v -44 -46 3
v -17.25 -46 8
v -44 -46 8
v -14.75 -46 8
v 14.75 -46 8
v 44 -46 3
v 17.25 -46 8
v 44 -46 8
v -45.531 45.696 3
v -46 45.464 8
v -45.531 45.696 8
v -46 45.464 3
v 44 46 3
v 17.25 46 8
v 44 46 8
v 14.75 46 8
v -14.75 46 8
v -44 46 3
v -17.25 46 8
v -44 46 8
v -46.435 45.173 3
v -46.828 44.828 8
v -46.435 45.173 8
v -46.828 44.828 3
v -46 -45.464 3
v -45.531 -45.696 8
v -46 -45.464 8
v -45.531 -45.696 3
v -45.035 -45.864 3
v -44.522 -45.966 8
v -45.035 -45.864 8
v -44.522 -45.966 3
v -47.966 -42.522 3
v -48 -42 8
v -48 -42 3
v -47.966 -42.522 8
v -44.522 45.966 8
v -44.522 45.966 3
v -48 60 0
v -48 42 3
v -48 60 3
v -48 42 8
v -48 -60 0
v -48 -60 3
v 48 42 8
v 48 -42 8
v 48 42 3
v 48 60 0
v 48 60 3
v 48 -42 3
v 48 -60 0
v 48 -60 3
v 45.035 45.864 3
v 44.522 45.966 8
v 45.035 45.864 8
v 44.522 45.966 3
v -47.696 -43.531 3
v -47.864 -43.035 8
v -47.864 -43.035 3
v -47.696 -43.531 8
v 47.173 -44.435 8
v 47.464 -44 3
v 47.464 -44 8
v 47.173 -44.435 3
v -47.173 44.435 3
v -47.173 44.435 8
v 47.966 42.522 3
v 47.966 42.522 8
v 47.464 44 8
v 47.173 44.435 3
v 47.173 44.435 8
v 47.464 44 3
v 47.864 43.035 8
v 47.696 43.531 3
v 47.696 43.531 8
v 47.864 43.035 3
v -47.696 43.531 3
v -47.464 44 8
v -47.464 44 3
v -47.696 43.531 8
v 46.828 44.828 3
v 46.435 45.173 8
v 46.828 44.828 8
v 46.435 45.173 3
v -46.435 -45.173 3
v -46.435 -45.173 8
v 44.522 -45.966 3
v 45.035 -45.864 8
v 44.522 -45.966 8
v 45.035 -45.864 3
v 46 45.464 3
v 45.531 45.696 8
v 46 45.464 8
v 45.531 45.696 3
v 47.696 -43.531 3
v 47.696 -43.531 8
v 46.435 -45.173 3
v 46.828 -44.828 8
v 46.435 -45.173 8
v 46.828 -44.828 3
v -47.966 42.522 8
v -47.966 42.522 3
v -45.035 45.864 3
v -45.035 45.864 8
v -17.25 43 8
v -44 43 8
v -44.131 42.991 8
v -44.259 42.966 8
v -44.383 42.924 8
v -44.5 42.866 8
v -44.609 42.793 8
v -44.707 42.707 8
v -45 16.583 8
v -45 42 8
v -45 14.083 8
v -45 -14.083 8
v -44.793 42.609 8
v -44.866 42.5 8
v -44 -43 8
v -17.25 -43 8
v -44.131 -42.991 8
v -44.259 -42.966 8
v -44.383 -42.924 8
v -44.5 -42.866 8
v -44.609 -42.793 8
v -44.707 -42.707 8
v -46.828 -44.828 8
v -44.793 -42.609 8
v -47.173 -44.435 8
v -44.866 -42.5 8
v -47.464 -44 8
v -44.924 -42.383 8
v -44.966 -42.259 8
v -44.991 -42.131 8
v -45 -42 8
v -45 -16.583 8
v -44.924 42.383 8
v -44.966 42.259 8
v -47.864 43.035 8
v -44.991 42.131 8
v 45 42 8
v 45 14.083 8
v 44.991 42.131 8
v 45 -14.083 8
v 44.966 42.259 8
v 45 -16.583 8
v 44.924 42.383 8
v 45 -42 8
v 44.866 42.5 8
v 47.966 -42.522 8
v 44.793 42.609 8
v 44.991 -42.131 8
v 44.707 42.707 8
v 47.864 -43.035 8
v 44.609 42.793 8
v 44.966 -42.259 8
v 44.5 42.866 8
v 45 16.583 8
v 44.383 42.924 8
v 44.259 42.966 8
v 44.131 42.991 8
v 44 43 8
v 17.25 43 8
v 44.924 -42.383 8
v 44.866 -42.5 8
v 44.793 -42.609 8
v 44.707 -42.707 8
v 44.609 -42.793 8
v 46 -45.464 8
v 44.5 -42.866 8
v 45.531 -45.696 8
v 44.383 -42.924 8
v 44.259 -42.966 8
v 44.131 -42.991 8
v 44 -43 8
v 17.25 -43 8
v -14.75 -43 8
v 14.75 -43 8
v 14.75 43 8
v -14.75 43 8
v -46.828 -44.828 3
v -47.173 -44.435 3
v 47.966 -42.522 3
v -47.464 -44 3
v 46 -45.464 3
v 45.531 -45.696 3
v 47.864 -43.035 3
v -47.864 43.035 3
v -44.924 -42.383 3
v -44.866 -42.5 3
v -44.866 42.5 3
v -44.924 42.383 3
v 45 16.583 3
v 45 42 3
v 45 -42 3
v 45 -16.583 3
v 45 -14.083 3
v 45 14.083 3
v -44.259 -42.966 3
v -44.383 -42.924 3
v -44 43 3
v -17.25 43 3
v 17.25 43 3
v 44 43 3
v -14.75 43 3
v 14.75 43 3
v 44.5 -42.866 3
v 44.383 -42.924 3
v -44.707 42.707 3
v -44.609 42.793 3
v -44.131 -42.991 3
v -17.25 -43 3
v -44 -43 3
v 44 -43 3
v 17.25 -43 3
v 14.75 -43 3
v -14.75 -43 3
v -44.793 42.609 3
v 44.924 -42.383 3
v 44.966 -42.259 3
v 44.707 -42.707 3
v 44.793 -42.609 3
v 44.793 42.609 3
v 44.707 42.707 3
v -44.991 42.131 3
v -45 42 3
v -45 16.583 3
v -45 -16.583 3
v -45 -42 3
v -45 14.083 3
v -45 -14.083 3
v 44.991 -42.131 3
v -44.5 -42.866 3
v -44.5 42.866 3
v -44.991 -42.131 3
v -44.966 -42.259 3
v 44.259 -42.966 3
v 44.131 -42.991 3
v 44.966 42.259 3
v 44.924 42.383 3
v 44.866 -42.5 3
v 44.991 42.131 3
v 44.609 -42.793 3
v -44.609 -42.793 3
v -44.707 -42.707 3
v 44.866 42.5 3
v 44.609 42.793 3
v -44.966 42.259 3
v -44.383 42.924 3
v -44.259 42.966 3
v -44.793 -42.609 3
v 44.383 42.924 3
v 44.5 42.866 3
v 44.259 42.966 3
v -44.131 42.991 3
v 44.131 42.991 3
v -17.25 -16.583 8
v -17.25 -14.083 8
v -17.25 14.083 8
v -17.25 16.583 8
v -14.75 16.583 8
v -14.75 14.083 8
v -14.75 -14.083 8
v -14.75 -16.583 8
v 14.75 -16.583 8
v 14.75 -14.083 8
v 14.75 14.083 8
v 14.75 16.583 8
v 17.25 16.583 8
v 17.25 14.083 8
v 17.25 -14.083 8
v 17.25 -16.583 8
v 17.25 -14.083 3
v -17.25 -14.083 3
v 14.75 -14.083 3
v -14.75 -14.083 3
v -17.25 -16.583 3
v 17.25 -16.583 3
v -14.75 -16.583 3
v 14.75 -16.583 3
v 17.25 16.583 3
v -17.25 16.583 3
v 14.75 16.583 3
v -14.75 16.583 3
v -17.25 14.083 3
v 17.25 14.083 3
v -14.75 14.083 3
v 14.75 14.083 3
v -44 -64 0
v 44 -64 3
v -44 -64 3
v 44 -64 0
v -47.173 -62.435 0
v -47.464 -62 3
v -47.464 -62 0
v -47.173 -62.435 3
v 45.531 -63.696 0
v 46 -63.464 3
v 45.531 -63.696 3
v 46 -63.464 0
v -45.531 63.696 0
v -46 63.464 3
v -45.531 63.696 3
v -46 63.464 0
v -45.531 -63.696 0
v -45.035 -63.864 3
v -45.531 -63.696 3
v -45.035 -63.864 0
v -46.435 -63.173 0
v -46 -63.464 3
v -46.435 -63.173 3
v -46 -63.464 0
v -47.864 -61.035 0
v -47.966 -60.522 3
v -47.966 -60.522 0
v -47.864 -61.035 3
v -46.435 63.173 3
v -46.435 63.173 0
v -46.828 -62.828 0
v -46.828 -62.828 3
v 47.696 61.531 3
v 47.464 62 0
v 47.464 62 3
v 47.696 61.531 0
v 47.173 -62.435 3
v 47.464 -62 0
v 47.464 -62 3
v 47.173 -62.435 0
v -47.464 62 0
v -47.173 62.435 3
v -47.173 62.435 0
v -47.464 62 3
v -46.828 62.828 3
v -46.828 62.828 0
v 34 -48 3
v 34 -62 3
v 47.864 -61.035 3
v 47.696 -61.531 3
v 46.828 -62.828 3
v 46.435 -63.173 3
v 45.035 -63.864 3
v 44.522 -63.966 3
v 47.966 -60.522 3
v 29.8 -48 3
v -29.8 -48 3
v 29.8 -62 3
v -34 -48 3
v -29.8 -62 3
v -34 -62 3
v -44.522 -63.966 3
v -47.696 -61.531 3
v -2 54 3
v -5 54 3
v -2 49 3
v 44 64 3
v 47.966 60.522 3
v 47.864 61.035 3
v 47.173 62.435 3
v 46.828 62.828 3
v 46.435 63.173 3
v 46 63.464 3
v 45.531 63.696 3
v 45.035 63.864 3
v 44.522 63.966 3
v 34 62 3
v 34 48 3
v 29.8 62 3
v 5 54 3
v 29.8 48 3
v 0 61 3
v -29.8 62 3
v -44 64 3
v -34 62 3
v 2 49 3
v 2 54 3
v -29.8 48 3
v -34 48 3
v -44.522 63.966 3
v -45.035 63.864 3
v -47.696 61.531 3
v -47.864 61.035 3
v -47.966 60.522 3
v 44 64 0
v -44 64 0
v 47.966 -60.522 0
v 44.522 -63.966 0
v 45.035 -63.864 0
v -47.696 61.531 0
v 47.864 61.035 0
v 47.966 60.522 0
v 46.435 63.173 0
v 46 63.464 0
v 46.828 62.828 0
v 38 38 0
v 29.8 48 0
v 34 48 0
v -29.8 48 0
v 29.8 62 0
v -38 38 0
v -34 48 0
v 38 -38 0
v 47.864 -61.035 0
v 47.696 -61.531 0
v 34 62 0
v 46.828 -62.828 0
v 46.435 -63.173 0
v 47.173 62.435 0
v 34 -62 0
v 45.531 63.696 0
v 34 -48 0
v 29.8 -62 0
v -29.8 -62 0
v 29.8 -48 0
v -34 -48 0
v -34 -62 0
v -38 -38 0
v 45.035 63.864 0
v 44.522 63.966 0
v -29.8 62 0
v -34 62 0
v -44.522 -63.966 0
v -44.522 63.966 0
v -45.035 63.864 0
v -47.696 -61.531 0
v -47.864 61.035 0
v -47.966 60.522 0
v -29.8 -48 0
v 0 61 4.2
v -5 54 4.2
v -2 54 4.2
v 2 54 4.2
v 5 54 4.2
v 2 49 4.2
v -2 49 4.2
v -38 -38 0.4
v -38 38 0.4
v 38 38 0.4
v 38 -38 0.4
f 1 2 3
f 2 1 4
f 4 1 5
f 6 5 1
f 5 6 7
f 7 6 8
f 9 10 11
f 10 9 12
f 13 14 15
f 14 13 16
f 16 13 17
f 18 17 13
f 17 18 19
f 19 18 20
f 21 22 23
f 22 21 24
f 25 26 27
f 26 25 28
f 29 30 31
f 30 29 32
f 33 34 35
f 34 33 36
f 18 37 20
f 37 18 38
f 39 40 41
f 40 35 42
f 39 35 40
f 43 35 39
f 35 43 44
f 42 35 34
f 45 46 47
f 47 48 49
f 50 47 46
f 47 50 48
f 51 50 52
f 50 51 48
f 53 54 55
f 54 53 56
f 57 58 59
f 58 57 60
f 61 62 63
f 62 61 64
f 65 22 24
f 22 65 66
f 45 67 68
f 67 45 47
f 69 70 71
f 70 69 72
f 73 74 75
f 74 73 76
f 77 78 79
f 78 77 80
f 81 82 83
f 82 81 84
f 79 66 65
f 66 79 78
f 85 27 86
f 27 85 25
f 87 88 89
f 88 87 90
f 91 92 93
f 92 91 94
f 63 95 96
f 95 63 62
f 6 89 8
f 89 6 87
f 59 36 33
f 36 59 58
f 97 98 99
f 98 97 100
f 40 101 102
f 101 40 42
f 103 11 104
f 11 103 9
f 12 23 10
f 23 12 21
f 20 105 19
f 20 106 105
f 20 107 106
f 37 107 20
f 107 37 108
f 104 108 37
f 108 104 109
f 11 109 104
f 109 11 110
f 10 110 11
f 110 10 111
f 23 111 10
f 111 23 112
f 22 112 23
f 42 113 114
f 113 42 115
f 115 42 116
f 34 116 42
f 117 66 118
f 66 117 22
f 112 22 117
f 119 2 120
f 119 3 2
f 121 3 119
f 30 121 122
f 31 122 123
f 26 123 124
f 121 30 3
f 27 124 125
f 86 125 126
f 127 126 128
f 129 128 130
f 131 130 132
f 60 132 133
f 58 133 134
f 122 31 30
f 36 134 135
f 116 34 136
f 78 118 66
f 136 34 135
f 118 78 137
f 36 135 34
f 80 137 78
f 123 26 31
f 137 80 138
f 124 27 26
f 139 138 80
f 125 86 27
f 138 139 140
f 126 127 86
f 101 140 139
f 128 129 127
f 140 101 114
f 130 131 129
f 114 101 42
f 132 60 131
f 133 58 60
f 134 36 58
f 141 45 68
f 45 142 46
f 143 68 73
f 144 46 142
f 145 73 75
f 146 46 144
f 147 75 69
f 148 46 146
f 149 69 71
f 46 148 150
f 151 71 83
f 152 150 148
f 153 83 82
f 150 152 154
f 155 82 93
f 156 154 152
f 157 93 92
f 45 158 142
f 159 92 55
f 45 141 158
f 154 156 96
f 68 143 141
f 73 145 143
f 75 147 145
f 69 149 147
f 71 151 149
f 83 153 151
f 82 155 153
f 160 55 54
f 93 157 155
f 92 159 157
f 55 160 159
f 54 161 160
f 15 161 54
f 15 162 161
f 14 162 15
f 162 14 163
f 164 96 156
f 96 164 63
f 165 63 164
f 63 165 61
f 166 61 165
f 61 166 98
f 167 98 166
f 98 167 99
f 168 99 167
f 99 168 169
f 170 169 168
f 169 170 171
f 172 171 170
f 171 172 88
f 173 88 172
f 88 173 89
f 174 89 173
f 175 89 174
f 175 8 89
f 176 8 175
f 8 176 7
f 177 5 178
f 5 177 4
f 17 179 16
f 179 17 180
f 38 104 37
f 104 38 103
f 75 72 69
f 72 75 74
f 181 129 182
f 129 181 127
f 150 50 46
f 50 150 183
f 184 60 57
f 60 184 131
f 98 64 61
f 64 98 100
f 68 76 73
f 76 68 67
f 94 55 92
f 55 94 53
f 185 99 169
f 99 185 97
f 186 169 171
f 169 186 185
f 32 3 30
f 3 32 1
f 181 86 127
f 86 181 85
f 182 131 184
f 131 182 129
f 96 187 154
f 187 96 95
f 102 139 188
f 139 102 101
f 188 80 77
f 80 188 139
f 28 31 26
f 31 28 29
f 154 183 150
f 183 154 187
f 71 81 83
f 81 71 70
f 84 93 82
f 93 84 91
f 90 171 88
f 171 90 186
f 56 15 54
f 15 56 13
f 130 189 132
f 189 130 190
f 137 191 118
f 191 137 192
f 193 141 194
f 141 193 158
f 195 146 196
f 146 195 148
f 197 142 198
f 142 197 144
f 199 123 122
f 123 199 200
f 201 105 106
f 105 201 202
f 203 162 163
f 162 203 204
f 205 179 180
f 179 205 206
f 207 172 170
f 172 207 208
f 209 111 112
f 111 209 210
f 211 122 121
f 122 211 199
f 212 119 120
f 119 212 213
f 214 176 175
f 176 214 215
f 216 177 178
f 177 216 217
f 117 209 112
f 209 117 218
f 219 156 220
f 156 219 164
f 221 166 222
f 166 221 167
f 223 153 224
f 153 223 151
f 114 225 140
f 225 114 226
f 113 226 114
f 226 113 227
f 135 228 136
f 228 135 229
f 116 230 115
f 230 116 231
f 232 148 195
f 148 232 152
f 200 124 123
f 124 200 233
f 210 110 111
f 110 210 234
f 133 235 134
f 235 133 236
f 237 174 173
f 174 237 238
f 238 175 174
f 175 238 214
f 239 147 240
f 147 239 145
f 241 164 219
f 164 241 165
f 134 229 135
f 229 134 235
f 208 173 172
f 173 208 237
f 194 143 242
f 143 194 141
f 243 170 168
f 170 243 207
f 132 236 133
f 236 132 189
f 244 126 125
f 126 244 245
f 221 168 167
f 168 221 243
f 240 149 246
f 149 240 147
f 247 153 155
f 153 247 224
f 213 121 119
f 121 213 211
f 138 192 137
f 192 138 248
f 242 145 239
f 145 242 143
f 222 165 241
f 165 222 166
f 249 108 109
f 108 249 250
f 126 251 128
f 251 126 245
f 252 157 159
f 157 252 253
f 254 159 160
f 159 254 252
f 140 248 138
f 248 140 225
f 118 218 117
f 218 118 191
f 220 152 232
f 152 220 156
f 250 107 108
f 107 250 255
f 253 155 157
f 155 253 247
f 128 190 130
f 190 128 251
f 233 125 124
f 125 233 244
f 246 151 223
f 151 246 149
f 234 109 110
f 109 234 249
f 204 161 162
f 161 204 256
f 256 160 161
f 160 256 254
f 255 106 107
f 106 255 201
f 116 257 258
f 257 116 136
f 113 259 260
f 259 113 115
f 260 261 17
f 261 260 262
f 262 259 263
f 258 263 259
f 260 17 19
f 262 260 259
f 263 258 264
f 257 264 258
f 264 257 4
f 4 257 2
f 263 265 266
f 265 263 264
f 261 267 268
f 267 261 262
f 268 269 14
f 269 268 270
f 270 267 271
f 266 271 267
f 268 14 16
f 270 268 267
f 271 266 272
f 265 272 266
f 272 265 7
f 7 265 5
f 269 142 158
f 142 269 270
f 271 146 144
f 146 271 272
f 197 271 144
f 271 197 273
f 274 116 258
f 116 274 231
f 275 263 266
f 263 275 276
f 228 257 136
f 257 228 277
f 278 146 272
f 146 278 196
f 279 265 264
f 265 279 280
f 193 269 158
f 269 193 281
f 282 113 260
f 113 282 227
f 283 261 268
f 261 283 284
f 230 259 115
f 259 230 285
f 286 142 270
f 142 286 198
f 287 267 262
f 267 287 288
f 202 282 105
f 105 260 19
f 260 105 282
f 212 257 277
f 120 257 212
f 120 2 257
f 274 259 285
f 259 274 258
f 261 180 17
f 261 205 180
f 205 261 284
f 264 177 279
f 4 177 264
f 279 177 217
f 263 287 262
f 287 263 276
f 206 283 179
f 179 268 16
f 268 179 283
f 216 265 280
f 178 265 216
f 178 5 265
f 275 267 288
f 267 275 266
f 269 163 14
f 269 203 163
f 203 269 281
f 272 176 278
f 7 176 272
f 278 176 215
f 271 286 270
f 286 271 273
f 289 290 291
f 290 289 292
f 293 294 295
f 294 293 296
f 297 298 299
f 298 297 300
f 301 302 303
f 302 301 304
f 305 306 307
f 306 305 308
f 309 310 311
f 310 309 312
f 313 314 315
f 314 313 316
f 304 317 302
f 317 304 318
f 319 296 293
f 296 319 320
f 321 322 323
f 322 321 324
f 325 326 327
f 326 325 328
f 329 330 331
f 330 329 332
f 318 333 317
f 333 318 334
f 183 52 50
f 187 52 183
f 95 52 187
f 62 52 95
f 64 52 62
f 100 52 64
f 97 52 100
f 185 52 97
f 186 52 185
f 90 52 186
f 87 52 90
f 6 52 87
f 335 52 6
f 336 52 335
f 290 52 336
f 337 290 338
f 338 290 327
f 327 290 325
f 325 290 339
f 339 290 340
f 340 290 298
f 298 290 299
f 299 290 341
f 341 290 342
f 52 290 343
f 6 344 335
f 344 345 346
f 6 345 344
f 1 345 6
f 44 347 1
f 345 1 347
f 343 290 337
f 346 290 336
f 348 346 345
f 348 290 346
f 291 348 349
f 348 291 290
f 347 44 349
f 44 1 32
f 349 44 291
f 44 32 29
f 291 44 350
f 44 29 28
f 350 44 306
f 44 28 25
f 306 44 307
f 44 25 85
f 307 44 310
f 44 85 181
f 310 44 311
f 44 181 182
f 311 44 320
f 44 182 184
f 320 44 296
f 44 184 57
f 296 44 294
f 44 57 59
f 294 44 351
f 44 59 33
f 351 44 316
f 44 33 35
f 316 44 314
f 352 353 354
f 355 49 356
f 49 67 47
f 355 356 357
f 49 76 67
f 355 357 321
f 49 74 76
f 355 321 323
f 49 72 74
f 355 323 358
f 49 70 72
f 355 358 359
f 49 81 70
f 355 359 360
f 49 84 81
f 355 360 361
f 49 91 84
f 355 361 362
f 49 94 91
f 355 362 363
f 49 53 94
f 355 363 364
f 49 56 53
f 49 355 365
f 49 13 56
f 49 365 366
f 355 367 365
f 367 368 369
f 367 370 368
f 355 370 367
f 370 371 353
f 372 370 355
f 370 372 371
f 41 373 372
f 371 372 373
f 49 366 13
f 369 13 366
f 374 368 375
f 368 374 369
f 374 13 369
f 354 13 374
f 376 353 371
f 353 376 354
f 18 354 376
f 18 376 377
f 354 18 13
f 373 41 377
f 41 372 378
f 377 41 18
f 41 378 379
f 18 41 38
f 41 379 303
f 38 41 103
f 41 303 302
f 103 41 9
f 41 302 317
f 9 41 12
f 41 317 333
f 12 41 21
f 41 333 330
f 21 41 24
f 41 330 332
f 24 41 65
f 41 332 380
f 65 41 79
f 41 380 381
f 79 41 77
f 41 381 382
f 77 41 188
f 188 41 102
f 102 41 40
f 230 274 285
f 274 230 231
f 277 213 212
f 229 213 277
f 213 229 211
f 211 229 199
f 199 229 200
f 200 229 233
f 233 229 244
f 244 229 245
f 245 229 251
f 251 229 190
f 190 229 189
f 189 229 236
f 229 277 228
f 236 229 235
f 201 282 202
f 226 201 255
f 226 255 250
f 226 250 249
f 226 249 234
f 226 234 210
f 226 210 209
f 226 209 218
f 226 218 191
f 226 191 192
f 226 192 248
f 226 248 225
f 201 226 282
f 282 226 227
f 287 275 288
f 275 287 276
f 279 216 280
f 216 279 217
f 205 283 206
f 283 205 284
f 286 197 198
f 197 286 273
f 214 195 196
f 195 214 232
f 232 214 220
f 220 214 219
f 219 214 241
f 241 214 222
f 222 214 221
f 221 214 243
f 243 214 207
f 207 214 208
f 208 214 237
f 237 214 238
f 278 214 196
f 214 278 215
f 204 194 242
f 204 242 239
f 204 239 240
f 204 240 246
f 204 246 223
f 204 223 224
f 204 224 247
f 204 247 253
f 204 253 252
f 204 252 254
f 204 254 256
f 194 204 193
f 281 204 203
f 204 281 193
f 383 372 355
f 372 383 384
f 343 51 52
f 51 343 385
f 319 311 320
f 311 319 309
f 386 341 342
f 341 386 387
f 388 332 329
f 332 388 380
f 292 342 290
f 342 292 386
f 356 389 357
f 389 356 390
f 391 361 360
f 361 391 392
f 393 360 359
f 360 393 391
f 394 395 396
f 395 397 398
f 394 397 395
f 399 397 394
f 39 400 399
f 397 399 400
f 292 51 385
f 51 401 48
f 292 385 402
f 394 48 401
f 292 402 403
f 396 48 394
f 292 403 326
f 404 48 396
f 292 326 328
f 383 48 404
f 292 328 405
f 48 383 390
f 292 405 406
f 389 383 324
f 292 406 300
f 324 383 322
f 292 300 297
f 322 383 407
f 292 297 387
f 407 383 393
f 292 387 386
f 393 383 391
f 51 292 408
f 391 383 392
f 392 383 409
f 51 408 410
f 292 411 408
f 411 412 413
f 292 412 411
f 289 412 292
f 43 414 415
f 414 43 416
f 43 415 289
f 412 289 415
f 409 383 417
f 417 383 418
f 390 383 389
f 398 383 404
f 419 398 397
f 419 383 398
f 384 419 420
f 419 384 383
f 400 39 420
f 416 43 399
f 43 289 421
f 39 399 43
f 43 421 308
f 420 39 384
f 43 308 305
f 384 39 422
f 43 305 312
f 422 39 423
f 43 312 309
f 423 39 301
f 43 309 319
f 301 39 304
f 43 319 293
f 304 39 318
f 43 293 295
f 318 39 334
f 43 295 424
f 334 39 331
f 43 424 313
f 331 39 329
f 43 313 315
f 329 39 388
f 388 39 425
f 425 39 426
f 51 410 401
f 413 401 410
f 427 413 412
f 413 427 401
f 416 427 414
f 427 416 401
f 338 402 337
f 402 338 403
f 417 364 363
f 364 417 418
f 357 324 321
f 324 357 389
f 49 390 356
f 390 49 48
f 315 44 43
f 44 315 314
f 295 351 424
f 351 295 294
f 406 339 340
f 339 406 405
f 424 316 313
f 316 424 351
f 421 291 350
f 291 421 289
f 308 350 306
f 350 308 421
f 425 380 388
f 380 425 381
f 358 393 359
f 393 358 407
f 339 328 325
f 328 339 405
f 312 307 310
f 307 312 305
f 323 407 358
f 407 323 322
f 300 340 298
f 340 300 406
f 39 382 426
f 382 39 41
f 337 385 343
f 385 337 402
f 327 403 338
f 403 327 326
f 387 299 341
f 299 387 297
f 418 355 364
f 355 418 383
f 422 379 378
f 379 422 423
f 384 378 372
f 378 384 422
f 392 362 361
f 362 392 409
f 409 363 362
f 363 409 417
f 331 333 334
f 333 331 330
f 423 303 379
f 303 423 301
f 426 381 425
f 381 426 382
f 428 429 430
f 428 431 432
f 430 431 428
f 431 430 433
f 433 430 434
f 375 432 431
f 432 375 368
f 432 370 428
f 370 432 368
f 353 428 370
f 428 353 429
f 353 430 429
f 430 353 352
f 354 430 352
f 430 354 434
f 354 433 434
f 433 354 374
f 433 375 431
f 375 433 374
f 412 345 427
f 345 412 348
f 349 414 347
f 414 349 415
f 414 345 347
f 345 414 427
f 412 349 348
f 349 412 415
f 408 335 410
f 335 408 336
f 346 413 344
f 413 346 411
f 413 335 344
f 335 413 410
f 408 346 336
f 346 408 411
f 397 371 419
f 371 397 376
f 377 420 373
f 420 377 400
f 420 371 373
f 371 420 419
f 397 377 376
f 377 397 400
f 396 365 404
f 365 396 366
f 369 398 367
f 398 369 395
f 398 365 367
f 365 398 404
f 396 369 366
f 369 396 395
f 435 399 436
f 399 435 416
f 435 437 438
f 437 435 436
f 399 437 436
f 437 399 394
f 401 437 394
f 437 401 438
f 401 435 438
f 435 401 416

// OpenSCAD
// roof_marker_plate.scad
//
// Rigid backing plate for an AprilTag on the ROOF, strapped to the ~4" truss
// beam at position B so the indoor Kasa camera sees the tag when the roof is
// SHUT and loses it when the roof rolls open.
//
// Sibling of marker_plate.scad, which does the same job on the scope. Same
// reasoning, different mounting: the scope one hangs off a screwed arm aimed
// at the camera, this one straps flat to a beam and never moves.
//
// WHY THE ROOF NEEDS ONE AT ALL
// Roof-shut currently has no positive signal from this camera. The gold star
// marker appears when the roof is OPEN and is hidden behind the roof structure
// when it is shut, so "shut" would have to be inferred from that marker's
// ABSENCE — and absence is exactly what a fogged lens, a dead camera or a
// mis-pointed one also look like. A tag that is present when shut turns that
// inference into a reading. The blue closed-marker the webcam uses is not in
// this camera's field, so it cannot serve.
//
// WHY A TAG AND NOT A COLOURED SHAPE
// The camera delivers greyscale infrared on 91% of frames (943 of 1041
// sampled), and on every one of those the colour channels are identically
// zero, so anything separating by hue is blind most of the night. The scope's
// AprilTag is found on 84% of IR frames and 98% of colour ones. A tag also
// carries an ID, which is what makes it immune to the repeating truss
// structure around it: a bar can look like another bar, a tag cannot.
//
// USE 36h11 id 1. The scope is id 0, the same dictionary, so
// scripts/scope_marker_check.py reads this with no code change and compare()
// ignores ids absent from its own reference — the two references never mix.
// Generate the printable image at the exact size with:
//
//   python scripts/make_tag.py 1 --mm 76 -o tag1_76mm.png
//
// FLATNESS IS THE WHOLE JOB — the same lesson as the scope plate. A paper tag
// taped to the curved shroud read cleanly at 13:41 and was undecodable by
// 08:48 next morning: the detector still FOUND the quadrilateral but the
// decode failed, because sampling the cell grid uses a planar homography and
// the paper had buckled. The failing read was LARGER and more face-on than the
// working one, so size and angle were both ruled out. Hence a stiff plate whose
// only real job is to hold the tag in a plane.
//
// PRINT FACE DOWN. The tag face is at z=0 and comes off the build plate
// smoothest. This is not cosmetic: a ribbed or textured tag face scatters the
// IR illuminator at night, which is precisely when this reading matters. It is
// also why the pattern is a printed sticker on a smooth face rather than
// raised geometry in a second filament — relief would light unevenly under a
// raking illuminator and fatten every module with its own shadow.
//
//   openscad -o roof_marker_plate.stl roof_marker_plate.scad
//
// MOUNTING. Two zip ties through the slot pairs, around the beam. Nothing
// drilled, nothing structural, removable without trace. Fit it with the ARROW
// pointing up-slope — the tag is unambiguous to the detector on its own, but
// the arrow makes a mis-fit obvious in a photograph. Then capture a shut frame
// and record its corners the way the scope reference was recorded.

/* [Plate] */
inch          = 25.4;
plate_w       = 96;           // stays inside the ~4" (101.6 mm) beam
plate_h       = 128;          // tag plus a strap tab top and bottom
plate_thick   = 3;            // solid thickness under the tag
corner_radius = 4;

/* [Tag] */
// The printed tag INCLUDING its white quiet zone. AprilTag needs light around
// its black border or the border merges into whatever is behind the plate;
// print the image with that margin rather than trusting the beam to be pale.
tag_size      = 76;
// Shallow pocket so the sticker locates itself and its edges are protected
// from a fingernail. 0 for a plain flat face.
tag_recess    = 0.4;

/* [Stiffening] */
// On the BACK only — the face stays flat. Most of the stiffness is the rim.
rim_height    = 5;
rim_width     = 3;
rib_height    = 5;
rib_width     = 2.5;
ribs_x        = 2;
ribs_y        = 2;

/* [Velcro pad] */
// A solid block in the middle of the BACK, flush with the rim and ribs, so a
// square of industrial hook-and-loop bonds to one continuous surface instead
// of to 2.5 mm rib strips with air between them. Square, centred, in mm;
// 0 = no pad. 50.8 = 2 in, which is what the truss tag uses.
velcro_pad    = 0;
// Pad HEIGHT in mm, and where its centre sits in y. 0 = a square velcro_pad
// on a side. Set velcro_h = plate_h for a full-height strip; velcro_h =
// plate_h/2 with velcro_y = -plate_h/4 for centre-to-bottom.
velcro_h      = 0;
velcro_y      = 0;

/* [Straps] */
// Standard 3.6 mm zip tie plus clearance. Slots sit in the tabs, clear of the
// tag and of the stiffening rim.
// straps=false drops the tabs AND their slots: the plate becomes tag + border,
// for a mount that is screwed, bonded or clamped rather than strapped. Added
// 2026-09-21 for the truss tag, whose bracket does not use ties.
straps        = true;
tie_w         = 4.2;
tie_l         = 14;
tab_h         = 18;           // strap tab depth at each end
tie_inset     = 14;           // from each side edge

$fn = 48;
EPS = 0.01;

module rounded_plate(w, h, t, r) {
  hull() for (x = [-w/2 + r, w/2 - r], y = [-h/2 + r, h/2 - r])
    translate([x, y, 0]) cylinder(r = r, h = t);
}

// Tab depth actually in force: zero when there are no straps, so the rim and
// ribs run to the plate edge instead of stopping short of tabs that are not
// there.
tab = straps ? tab_h : 0;

module tie_slots() {
  for (sy = [-1, 1], sx = [-1, 1])
    translate([sx * (plate_w/2 - tie_inset - tie_w/2),
               sy * (plate_h/2 - tab/2),
               plate_thick/2])
      cube([tie_w, tie_l, plate_thick + 2], center = true);
}

// Raised on the BACK so it cannot disturb the tag face, and outside the tag
// area so it never shades it.
arrow_y  = plate_h/2 - (straps ? tab_h/2 : rim_width + 9);
pad_top  = velcro_y + (velcro_h > 0 ? velcro_h : velcro_pad)/2;
arrow_x  = (velcro_pad > 0 && pad_top > arrow_y - 8) ? velcro_pad/2 + 12 : 0;

module up_arrow() {
  // Clear of the stiffening rim's inner wall. Sitting exactly against it gives
  // two coincident faces and a non-manifold export, which slicers repair
  // differently and some not at all.
  // Shifted clear of the velcro pad in x when the pad is tall enough to reach
  // it: buried under the pad the arrow is invisible, and raised ON to the pad
  // it would be a bump exactly where the hook-and-loop must lie flat.
  translate([arrow_x, plate_h/2 - (straps ? tab_h/2 : rim_width + 9), plate_thick - EPS])
    linear_extrude(1.2 + EPS)
      polygon([[0, 6], [-5, -1], [-2, -1], [-2, -6],
               [2, -6], [2, -1], [5, -1]]);
}

// Flush with rib_height so the pad, the ribs and the rim share one plane: the
// pad must BE the contact surface, not sit below the ribs that would otherwise
// hold the plate off its mount.
module velcro_block() {
  if (velcro_pad > 0)
    translate([0, 0, plate_thick - EPS])
      linear_extrude(rib_height + EPS)
        translate([0, velcro_y])
          square([velcro_pad, velcro_h > 0 ? velcro_h : velcro_pad], center = true);
}

module stiffeners() {
  inner_w = plate_w - 2 * rim_width;
  inner_h = plate_h - 2 * tab;            // keep the tabs flat for the straps
  // perimeter rim, inset from the tabs
  difference() {
    translate([0, 0, plate_thick - EPS])
      rounded_plate(plate_w, inner_h, rim_height + EPS, corner_radius);
    translate([0, 0, plate_thick - 2 * EPS])
      rounded_plate(plate_w - 2 * rim_width, inner_h - 2 * rim_width,
                    rim_height + 4 * EPS, max(0.1, corner_radius - rim_width));
  }
  // Ribs sit ON the plate (z from plate_thick up), so they are centred in X
  // and Y only -- a cube centred in Z as well would sink half its height into
  // the tag face, which is the one surface that must stay untouched.
  for (i = [1 : ribs_x])
    translate([0, -inner_h/2 + i * inner_h / (ribs_x + 1), plate_thick - EPS])
      linear_extrude(rib_height + EPS)
        square([inner_w, rib_width], center = true);
  for (i = [1 : ribs_y])
    translate([-plate_w/2 + i * plate_w / (ribs_y + 1), 0, plate_thick - EPS])
      linear_extrude(rib_height + EPS)
        square([rib_width, inner_h], center = true);
}

difference() {
  union() {
    rounded_plate(plate_w, plate_h, plate_thick, corner_radius);
    stiffeners();
    velcro_block();
    up_arrow();
  }
  // tag pocket, in the FACE (z=0, the build-plate side)
  if (tag_recess > 0)
    translate([0, 0, -EPS])
      linear_extrude(tag_recess + EPS)
        square([tag_size, tag_size], center = true);
  if (straps) tie_slots();
}

echo(str("plate ", plate_w, " x ", plate_h, " x ", plate_thick, " mm",
         straps ? "" : " (no strap tabs)"));
echo(str("tag area ", tag_size, " mm sq, recess ", tag_recess, " mm"));
if (velcro_pad > 0)
  echo(str("velcro pad ", velcro_pad, " x ",
           velcro_h > 0 ? velcro_h : velcro_pad,
           " mm at y = ", velcro_y, ", flush at z = ", plate_thick + rib_height, " mm"));
